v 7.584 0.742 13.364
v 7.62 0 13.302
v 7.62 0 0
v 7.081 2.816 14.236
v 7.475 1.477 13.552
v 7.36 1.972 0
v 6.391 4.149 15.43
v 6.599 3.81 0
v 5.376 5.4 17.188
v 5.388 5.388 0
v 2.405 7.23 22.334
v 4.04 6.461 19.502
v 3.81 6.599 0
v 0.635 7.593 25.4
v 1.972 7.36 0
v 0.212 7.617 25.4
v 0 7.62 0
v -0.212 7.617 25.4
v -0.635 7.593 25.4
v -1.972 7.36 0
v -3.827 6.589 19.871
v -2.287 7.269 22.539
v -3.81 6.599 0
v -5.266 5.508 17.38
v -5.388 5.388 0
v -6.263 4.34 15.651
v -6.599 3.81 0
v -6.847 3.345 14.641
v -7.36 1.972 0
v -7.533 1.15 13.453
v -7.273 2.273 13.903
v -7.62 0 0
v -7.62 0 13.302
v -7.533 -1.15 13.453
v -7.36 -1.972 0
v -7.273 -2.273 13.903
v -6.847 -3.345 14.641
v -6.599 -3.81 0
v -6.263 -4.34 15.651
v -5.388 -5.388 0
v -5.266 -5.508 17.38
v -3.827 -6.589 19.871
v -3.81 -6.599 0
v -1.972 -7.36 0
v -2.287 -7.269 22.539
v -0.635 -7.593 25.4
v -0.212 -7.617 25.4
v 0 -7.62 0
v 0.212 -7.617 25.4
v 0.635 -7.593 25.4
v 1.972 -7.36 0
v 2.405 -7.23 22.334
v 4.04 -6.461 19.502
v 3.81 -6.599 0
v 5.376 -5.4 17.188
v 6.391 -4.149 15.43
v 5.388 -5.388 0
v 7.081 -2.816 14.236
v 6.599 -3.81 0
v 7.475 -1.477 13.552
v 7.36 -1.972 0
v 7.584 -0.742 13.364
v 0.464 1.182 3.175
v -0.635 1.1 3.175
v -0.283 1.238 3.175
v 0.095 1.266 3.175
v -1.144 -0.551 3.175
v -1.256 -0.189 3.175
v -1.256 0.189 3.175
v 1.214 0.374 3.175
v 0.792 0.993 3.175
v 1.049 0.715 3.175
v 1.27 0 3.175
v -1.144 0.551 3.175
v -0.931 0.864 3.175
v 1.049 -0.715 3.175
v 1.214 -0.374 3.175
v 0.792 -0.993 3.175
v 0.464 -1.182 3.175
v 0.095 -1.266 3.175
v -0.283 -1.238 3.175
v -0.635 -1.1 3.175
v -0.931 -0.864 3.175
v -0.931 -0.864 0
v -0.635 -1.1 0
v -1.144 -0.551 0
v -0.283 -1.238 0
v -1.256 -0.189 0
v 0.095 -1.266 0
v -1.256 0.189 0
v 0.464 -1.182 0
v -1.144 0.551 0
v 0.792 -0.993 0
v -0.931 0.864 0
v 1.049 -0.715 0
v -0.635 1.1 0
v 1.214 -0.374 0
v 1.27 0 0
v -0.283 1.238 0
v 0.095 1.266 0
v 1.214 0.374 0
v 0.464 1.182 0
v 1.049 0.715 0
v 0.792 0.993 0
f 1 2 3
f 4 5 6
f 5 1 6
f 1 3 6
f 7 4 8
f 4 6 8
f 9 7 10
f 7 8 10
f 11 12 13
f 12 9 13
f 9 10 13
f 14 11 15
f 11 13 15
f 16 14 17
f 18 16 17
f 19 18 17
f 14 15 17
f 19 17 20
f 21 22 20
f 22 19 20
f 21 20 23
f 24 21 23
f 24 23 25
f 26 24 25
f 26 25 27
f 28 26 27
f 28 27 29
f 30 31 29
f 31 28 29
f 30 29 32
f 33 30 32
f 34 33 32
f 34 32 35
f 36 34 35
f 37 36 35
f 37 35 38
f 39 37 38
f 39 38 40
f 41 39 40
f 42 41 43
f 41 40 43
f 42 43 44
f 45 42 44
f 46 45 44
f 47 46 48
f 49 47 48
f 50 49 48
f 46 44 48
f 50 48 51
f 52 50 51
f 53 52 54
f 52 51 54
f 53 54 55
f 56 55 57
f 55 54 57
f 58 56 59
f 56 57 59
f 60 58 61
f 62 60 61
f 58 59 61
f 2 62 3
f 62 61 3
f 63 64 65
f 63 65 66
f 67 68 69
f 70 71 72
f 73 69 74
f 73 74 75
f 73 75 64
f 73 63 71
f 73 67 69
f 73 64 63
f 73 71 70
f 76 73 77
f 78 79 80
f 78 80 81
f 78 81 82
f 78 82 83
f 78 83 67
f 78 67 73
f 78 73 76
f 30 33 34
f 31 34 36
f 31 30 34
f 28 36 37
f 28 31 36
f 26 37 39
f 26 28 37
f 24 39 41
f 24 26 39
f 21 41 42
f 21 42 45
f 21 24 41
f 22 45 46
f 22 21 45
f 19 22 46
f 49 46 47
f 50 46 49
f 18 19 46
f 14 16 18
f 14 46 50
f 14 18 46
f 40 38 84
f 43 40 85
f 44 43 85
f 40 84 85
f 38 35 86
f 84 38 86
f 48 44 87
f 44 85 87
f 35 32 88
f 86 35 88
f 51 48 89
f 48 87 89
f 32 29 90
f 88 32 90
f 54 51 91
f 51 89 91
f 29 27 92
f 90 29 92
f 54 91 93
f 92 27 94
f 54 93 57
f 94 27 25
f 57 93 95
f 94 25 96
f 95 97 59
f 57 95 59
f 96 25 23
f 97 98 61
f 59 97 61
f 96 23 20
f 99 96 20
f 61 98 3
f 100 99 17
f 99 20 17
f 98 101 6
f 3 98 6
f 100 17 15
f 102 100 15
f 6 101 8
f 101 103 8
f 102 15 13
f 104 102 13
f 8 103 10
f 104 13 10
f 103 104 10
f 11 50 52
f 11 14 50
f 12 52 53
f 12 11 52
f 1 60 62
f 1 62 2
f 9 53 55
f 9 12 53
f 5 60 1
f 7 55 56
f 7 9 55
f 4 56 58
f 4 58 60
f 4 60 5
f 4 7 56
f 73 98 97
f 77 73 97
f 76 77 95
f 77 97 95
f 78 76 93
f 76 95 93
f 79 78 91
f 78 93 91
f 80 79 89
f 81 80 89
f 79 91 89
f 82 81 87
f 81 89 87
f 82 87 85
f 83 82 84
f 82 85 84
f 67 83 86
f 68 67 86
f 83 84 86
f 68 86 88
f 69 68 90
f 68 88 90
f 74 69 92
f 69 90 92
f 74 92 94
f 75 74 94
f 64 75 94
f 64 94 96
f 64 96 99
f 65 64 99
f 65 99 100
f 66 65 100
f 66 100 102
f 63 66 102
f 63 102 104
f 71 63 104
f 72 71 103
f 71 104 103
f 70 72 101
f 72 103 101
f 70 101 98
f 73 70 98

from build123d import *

# Parameters (mm, degrees)
F0_R          = 7.62
F1_DEPTH      = 25.4
F3_DEPTH      = 7.621
F3_DEPTH_BACK = 7.621
F4_R          = 1.27
F5_DEPTH      = 3.175


with BuildPart() as f1:
    # F0 (on Top) → F1 (new body)
    with BuildSketch(Plane.XY):
        Circle(F0_R)
    extrude(amount=F1_DEPTH)

    # F2 (on Front) → F3 (cut, two sides)
    with BuildSketch(Plane.XZ) as f3_sk:
        Polygon((-7.62, 36.5128359933), (-7.62, 13.3016251091), (-0.635, 25.4), (0, 26.4998522628), (0.635, 25.4), (7.62, 13.3016251091), (7.62, 36.5128359933), align=None)
        Polygon((0, 26.4998522628), (-0.635, 25.4), (0.635, 25.4), align=None)
    extrude(amount=-F3_DEPTH, mode=Mode.SUBTRACT)
    extrude(f3_sk.sketch, amount=F3_DEPTH_BACK, mode=Mode.SUBTRACT)

    # F4 (on face) → F5 (cut)
    with BuildSketch(Plane(origin=(0, 0, 0), x_dir=(1, 0, 0), z_dir=(0, 0, -1))):
        Circle(F4_R)
    extrude(amount=-F5_DEPTH, mode=Mode.SUBTRACT)


solid = f1.part
